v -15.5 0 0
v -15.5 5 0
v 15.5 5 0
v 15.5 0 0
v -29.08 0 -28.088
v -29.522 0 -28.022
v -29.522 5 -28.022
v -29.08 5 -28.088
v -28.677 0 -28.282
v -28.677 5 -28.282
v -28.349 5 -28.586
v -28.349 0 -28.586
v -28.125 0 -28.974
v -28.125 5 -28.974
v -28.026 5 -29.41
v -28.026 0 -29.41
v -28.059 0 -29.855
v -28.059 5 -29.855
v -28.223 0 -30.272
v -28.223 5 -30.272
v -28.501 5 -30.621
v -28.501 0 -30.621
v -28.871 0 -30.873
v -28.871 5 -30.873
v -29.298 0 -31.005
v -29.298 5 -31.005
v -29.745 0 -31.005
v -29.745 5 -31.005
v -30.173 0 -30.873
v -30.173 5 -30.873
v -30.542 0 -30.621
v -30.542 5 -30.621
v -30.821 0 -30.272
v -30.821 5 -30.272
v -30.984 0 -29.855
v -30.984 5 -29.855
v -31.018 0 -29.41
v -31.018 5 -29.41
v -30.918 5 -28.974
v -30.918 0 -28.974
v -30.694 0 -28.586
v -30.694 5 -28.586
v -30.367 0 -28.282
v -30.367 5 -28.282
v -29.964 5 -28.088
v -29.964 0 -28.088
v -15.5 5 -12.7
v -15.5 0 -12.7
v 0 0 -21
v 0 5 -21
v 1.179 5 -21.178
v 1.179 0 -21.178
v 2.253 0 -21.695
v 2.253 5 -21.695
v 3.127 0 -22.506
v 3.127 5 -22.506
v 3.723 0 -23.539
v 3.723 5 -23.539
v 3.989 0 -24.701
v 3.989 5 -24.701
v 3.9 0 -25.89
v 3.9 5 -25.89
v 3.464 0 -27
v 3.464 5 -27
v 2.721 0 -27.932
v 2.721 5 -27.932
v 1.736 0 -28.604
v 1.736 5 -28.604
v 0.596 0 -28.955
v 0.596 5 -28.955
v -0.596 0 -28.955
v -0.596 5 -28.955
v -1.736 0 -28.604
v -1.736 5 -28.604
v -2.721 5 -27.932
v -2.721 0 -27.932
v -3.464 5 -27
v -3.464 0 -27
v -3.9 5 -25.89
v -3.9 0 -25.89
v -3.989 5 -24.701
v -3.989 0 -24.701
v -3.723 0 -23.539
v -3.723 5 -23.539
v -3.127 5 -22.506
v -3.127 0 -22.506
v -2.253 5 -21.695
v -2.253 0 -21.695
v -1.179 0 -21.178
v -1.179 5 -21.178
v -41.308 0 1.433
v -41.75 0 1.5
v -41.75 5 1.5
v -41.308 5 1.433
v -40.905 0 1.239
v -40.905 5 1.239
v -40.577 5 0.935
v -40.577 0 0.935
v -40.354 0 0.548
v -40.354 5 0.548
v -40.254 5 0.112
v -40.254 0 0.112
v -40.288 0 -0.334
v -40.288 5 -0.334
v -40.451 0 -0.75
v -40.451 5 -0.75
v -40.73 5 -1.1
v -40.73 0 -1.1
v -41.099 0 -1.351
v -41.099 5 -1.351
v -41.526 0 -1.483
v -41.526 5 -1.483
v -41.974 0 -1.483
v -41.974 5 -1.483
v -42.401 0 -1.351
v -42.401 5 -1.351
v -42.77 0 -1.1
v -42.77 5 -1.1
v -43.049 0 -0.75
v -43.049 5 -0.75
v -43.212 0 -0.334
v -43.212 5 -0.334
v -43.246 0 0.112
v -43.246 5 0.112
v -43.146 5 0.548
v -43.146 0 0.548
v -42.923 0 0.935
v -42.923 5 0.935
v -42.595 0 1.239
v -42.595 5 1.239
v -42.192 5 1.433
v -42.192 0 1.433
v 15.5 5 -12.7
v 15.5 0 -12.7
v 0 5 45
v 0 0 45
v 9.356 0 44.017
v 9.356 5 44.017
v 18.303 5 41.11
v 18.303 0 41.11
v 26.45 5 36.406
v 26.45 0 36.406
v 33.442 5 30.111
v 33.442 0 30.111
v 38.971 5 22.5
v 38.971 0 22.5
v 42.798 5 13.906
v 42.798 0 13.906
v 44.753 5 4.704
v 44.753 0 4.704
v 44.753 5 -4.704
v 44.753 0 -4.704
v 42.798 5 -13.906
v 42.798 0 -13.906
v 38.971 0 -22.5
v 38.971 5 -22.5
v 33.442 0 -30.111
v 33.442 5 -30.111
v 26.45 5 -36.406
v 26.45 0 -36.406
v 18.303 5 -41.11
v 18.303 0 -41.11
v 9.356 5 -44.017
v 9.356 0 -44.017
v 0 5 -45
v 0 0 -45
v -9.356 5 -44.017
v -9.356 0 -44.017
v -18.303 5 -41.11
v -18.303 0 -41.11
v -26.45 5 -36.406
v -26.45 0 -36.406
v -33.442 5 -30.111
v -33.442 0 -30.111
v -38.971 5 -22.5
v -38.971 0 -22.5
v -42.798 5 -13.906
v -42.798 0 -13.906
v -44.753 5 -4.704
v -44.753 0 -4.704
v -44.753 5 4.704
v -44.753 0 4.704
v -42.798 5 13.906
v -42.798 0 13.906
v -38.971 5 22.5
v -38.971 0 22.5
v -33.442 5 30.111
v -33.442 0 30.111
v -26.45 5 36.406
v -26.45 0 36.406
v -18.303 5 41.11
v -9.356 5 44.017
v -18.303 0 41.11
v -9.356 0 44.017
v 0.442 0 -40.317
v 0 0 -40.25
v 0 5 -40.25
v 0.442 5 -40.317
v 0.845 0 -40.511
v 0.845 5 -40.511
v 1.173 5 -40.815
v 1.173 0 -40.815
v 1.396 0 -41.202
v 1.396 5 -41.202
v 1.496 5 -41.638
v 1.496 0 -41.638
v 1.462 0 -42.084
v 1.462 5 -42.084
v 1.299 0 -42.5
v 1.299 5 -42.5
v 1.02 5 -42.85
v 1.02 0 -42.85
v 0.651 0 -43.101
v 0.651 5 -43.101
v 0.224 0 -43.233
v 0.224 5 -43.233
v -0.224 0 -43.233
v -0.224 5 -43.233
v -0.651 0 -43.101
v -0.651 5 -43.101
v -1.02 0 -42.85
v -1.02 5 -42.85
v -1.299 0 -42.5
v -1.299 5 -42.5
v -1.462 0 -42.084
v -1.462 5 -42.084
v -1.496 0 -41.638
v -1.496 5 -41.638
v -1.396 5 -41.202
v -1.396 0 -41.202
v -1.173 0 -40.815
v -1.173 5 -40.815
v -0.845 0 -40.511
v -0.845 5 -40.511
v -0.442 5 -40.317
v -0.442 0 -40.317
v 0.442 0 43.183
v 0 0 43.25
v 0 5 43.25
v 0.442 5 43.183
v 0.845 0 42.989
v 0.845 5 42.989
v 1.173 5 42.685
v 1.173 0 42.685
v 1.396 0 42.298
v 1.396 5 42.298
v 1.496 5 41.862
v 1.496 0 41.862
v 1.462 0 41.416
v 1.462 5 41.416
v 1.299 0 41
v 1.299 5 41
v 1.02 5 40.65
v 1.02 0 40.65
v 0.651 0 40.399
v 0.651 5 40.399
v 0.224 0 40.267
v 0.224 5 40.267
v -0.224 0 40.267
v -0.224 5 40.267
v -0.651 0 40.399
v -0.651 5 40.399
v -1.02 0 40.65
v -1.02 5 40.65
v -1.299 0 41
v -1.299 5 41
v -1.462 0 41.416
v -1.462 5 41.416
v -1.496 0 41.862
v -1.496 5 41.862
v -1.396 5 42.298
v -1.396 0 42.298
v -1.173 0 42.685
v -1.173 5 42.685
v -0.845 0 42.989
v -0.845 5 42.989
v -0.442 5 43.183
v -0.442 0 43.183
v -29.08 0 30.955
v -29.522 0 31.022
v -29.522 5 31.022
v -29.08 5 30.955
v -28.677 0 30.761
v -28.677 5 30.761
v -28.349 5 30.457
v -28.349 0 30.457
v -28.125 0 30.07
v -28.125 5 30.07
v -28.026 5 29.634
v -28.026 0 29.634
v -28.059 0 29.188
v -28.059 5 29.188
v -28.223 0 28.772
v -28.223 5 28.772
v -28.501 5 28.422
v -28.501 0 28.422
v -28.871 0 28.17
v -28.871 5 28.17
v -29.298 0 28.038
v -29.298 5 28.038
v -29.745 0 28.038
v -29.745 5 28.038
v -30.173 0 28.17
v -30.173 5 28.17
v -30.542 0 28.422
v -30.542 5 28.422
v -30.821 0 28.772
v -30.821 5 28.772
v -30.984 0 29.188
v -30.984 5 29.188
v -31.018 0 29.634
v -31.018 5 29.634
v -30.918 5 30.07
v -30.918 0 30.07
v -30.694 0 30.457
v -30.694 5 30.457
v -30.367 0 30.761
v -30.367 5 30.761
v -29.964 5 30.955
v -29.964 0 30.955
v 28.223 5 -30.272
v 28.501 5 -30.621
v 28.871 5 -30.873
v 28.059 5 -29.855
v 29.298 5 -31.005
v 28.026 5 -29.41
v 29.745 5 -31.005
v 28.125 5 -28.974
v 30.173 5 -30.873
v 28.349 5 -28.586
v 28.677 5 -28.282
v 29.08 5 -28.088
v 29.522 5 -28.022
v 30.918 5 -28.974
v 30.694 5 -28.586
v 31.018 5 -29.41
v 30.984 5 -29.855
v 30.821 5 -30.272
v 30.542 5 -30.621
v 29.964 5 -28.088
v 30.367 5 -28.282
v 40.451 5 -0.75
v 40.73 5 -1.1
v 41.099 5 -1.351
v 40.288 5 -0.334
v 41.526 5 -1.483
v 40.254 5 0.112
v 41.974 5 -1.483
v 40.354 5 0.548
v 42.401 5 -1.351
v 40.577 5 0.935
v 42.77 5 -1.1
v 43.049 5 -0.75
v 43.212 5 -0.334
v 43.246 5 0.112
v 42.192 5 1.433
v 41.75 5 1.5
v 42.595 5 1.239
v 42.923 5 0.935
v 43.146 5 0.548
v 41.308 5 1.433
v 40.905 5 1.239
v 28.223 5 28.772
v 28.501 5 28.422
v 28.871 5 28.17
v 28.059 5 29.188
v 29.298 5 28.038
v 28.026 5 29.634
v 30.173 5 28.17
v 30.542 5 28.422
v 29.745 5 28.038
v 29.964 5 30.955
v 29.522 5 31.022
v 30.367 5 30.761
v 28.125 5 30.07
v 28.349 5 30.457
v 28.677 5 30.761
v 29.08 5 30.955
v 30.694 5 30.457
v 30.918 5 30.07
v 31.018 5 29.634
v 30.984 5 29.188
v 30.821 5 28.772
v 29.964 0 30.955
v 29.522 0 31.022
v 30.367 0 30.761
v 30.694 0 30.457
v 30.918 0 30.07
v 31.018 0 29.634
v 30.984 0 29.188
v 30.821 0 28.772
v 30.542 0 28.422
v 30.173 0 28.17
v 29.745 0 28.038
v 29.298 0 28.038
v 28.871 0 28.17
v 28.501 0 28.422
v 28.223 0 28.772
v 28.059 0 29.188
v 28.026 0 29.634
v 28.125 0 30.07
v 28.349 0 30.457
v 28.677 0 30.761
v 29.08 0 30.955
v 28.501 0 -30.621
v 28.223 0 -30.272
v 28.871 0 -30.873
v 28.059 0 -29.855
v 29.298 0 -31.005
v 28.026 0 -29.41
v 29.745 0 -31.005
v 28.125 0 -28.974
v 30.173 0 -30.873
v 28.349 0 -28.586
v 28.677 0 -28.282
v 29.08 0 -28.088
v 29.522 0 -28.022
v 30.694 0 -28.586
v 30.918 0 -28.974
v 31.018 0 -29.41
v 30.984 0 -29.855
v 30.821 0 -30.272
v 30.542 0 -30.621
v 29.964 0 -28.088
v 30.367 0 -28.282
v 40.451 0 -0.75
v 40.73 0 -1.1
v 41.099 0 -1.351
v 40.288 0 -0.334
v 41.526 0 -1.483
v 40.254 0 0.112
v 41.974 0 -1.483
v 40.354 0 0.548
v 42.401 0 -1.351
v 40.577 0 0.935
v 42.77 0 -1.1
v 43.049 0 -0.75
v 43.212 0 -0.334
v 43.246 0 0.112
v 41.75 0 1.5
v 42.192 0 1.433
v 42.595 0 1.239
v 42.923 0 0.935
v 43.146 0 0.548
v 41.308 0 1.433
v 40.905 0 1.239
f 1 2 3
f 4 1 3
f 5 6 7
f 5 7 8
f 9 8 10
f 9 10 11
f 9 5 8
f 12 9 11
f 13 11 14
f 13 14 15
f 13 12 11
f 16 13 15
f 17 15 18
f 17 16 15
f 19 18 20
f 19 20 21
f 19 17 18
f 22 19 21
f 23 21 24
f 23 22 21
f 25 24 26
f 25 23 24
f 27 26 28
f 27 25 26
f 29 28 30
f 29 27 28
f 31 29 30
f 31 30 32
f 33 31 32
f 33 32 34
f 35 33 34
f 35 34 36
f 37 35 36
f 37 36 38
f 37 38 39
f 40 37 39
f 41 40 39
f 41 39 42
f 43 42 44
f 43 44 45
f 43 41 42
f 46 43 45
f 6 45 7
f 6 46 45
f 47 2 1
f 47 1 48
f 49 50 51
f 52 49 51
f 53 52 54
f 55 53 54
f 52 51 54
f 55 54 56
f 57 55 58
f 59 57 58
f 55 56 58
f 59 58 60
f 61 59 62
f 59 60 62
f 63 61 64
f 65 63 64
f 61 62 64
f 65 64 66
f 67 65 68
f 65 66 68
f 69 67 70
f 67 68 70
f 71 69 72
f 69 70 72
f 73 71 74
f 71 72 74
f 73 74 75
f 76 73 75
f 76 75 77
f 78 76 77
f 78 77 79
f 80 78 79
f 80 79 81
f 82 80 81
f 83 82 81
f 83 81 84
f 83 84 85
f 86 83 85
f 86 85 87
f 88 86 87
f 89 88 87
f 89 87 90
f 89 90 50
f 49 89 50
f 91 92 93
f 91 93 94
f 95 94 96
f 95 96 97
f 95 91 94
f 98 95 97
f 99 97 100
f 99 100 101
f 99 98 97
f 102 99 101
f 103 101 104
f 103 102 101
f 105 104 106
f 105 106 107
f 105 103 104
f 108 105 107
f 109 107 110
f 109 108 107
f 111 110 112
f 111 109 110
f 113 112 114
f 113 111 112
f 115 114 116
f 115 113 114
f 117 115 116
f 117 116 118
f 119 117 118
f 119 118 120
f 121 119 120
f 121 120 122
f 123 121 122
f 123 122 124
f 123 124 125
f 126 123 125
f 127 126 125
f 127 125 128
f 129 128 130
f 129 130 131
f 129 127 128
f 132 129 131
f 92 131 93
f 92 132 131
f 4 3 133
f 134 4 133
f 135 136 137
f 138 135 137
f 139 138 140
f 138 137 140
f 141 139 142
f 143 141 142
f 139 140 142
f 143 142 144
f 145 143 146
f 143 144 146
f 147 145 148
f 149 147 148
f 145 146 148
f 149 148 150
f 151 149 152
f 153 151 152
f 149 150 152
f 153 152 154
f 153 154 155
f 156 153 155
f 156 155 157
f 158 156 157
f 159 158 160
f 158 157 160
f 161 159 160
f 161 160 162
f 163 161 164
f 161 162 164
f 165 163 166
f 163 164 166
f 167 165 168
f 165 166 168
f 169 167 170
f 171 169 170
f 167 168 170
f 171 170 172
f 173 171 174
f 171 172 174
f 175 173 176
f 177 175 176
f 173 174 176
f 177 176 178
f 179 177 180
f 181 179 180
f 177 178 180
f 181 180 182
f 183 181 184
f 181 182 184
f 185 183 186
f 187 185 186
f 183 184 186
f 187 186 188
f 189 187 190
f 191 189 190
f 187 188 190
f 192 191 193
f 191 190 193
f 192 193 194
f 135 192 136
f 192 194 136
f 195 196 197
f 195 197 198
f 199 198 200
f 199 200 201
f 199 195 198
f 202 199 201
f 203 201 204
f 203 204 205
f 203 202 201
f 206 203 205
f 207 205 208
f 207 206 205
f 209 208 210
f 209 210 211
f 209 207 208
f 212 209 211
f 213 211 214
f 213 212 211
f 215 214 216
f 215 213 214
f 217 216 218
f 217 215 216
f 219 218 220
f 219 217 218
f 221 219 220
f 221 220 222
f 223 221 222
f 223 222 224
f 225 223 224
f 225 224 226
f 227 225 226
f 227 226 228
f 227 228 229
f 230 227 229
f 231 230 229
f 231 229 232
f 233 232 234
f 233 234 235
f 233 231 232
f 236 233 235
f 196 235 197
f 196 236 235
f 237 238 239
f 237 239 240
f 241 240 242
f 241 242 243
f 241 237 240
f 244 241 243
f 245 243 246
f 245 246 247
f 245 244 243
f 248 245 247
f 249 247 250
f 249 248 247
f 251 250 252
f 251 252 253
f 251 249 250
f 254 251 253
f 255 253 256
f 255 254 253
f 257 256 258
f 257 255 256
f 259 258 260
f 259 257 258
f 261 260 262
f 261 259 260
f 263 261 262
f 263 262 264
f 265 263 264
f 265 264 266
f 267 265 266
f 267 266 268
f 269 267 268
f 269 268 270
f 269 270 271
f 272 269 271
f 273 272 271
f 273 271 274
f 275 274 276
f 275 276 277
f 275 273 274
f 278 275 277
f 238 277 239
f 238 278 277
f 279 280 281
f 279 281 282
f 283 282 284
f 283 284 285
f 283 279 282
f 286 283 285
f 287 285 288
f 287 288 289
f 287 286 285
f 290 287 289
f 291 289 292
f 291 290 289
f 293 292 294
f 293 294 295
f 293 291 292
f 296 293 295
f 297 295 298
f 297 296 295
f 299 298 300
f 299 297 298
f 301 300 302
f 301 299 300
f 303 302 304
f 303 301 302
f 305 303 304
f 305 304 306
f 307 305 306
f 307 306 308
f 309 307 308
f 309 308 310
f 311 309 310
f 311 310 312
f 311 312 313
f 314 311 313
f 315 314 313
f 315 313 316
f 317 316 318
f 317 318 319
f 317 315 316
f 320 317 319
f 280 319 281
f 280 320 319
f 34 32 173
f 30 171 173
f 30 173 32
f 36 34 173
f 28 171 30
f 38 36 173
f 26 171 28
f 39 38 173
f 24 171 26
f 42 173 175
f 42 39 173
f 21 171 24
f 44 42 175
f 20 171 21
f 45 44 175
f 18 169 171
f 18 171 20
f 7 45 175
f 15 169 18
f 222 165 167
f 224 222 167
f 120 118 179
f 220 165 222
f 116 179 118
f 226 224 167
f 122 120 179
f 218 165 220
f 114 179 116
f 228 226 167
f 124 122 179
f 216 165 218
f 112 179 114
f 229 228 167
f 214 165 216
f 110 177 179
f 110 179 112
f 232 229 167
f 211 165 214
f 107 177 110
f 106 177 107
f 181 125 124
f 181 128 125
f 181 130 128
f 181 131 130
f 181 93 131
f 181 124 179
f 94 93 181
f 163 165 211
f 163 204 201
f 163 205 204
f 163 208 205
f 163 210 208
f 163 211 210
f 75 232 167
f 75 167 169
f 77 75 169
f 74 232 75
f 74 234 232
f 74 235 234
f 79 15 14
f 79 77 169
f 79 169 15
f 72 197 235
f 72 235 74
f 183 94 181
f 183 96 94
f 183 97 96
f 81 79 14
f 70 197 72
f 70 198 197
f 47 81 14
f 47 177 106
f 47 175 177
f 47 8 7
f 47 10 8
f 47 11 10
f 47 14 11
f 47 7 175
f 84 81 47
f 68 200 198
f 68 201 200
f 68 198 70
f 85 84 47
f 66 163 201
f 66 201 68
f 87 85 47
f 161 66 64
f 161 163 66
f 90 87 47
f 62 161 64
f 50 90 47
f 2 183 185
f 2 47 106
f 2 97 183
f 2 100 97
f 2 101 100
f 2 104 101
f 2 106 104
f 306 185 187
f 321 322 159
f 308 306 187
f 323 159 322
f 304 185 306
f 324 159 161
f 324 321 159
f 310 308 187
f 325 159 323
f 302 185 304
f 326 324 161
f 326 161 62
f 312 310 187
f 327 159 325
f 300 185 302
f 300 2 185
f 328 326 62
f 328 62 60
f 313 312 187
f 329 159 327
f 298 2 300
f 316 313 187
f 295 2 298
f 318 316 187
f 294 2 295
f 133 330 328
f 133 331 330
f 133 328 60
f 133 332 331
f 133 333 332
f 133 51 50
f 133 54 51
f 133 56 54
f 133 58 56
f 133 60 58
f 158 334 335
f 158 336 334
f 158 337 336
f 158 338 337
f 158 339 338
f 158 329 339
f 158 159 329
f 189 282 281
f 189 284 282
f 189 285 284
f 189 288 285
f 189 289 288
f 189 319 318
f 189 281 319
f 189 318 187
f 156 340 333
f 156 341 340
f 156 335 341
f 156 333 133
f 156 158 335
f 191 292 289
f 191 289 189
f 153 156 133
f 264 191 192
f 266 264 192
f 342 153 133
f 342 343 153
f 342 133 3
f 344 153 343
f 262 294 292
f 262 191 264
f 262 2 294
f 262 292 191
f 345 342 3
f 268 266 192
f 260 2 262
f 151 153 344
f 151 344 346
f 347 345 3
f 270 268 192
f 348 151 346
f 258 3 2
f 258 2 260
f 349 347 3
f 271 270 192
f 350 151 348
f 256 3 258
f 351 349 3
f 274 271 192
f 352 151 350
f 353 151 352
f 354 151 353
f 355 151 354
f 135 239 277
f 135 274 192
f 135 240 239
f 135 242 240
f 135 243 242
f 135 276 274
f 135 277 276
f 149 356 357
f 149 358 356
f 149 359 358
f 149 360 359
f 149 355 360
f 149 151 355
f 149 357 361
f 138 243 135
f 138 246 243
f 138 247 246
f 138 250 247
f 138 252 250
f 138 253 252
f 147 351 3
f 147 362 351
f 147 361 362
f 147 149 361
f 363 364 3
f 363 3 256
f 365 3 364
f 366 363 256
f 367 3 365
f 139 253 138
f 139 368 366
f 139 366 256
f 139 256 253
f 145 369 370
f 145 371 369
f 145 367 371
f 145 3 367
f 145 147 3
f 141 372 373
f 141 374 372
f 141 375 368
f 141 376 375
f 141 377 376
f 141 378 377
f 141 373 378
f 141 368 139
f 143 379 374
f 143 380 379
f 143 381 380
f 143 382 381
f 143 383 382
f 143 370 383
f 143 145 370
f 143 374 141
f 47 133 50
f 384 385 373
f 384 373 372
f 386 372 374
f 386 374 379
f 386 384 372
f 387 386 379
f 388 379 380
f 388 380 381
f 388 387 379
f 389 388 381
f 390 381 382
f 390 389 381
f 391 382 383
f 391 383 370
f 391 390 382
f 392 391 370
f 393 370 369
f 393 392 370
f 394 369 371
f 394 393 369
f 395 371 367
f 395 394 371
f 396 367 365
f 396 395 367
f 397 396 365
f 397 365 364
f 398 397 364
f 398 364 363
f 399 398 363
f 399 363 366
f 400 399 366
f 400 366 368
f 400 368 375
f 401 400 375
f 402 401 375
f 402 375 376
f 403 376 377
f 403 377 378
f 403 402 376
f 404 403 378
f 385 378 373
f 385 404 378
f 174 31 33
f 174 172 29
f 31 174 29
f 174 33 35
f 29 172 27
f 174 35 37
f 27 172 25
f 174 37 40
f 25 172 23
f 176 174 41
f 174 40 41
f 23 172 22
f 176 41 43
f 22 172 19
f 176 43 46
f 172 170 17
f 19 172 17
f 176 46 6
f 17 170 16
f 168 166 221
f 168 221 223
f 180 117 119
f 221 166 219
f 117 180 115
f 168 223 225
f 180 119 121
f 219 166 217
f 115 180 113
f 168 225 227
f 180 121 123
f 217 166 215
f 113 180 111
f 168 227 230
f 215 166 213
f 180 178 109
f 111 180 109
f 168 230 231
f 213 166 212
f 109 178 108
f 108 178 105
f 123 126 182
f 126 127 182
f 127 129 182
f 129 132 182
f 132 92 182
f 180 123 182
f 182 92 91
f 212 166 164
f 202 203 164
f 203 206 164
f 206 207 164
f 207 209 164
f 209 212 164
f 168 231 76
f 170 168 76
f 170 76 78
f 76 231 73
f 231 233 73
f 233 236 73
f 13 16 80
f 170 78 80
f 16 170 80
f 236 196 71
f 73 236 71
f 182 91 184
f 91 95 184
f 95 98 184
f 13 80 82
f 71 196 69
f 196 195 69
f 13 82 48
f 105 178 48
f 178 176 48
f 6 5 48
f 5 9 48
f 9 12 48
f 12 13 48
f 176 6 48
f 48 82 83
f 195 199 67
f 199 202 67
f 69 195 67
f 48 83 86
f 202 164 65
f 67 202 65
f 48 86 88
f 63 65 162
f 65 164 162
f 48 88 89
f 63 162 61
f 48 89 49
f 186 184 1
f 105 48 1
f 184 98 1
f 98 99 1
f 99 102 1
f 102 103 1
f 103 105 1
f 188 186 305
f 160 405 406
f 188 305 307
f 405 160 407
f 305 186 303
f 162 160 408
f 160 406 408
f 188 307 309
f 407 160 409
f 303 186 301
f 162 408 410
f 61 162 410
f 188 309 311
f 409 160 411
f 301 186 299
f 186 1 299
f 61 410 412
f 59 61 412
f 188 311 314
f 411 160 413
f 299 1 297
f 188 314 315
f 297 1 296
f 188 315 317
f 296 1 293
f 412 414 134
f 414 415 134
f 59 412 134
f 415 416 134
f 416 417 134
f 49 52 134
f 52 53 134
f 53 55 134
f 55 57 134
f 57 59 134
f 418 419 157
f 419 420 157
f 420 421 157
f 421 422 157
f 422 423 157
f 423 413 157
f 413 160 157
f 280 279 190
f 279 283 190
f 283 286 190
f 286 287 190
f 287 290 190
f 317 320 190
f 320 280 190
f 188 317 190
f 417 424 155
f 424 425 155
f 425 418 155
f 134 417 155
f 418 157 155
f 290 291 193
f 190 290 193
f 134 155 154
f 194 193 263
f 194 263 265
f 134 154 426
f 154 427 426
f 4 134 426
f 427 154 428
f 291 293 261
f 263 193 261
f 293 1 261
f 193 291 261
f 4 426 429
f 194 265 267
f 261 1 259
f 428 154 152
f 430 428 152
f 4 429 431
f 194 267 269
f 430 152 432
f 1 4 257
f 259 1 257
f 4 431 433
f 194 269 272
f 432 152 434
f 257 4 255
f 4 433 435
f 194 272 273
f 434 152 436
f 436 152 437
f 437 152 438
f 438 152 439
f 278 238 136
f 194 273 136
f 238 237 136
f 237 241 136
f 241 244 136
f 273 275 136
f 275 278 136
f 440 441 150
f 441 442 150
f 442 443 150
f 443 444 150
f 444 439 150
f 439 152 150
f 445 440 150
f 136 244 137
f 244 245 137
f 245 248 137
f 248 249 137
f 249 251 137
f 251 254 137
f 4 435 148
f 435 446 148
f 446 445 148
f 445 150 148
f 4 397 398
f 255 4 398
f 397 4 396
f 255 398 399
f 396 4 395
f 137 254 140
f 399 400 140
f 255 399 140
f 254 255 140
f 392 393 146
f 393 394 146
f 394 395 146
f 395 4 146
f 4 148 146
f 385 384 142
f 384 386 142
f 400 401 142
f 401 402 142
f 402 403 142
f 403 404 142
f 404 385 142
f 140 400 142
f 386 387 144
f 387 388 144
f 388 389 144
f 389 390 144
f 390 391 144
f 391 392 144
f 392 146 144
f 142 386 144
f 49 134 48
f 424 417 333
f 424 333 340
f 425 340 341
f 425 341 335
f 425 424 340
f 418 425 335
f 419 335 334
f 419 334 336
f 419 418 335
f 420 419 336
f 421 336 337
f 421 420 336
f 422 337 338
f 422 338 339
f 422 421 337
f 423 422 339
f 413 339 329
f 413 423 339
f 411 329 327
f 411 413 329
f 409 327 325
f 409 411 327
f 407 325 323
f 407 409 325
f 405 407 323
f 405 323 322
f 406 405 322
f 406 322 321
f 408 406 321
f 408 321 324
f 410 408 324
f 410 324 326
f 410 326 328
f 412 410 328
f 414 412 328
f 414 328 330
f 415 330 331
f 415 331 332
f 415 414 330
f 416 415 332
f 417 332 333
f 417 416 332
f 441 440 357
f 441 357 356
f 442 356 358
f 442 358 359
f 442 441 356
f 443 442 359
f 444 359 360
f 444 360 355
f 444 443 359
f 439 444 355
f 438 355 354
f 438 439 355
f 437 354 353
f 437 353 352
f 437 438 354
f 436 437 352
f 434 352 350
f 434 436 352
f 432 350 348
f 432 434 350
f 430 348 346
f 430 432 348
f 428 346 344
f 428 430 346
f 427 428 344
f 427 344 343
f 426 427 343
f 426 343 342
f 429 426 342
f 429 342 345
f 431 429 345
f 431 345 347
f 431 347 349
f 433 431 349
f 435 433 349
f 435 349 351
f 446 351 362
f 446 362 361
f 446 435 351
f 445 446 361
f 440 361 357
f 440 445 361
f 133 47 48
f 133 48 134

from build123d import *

# Parameters (mm, degrees)
SKETCH1_R           = 45
SKETCH1_R_2         = 1.5
BOSS_EXTRUDE2_DEPTH = 5
SKETCH2_W           = 31
SKETCH2_H           = 12.7
CUT_EXTRUDE2_DEPTH  = 10
SKETCH4_R           = 4
CUT_EXTRUDE6_DEPTH  = 10


with BuildPart() as part:
    # Sketch1 → Boss-Extrude2 (new body)
    with BuildSketch(Plane(origin=(0, 0, 0), x_dir=(1, 0, 0), z_dir=(0, 1, 0))):
        with Locations(Location((0, 0, 0), (0, 0, 270))):
            Circle(SKETCH1_R)
        with Locations(Location((0, 41.75, 0), (0, 0, 270))):
            Circle(SKETCH1_R_2, mode=Mode.SUBTRACT)
        with Locations(Location((29.521708115, 29.521708115, 0), (0, 0, 270))):
            Circle(SKETCH1_R_2, mode=Mode.SUBTRACT)
        with Locations(Location((41.75, 0, 0), (0, 0, 270))):
            Circle(SKETCH1_R_2, mode=Mode.SUBTRACT)
        with Locations(Location((29.521708115, -29.521708115, 0), (0, 0, 270))):
            Circle(SKETCH1_R_2, mode=Mode.SUBTRACT)
        with Locations(Location((0, -41.75, 0), (0, 0, 270))):
            Circle(SKETCH1_R_2, mode=Mode.SUBTRACT)
        with Locations(Location((-29.521708115, -29.521708115, 0), (0, 0, 270))):
            Circle(SKETCH1_R_2, mode=Mode.SUBTRACT)
        with Locations(Location((-41.75, 0, 0), (0, 0, 270))):
            Circle(SKETCH1_R_2, mode=Mode.SUBTRACT)
        with Locations(Location((-29.521708115, 29.521708115, 0), (0, 0, 270))):
            Circle(SKETCH1_R_2, mode=Mode.SUBTRACT)
    extrude(amount=BOSS_EXTRUDE2_DEPTH)

    # Sketch2 → Cut-Extrude2 (cut)
    with BuildSketch(Plane(origin=(0, 5, 0), x_dir=(1, 0, 0), z_dir=(0, 1, 0))):
        with Locations((0, 6.35)):
            Rectangle(SKETCH2_W, SKETCH2_H)
    extrude(amount=-CUT_EXTRUDE2_DEPTH, mode=Mode.SUBTRACT)

    # Sketch4 → Cut-Extrude6 (cut)
    with BuildSketch(Plane(origin=(0, 5, 0), x_dir=(1, 0, 0), z_dir=(0, 1, 0))):
        with Locations(Location((0, 25, 0), (0, 0, 270))):
            Circle(SKETCH4_R)
    extrude(amount=-CUT_EXTRUDE6_DEPTH, mode=Mode.SUBTRACT)


solid = part.part
